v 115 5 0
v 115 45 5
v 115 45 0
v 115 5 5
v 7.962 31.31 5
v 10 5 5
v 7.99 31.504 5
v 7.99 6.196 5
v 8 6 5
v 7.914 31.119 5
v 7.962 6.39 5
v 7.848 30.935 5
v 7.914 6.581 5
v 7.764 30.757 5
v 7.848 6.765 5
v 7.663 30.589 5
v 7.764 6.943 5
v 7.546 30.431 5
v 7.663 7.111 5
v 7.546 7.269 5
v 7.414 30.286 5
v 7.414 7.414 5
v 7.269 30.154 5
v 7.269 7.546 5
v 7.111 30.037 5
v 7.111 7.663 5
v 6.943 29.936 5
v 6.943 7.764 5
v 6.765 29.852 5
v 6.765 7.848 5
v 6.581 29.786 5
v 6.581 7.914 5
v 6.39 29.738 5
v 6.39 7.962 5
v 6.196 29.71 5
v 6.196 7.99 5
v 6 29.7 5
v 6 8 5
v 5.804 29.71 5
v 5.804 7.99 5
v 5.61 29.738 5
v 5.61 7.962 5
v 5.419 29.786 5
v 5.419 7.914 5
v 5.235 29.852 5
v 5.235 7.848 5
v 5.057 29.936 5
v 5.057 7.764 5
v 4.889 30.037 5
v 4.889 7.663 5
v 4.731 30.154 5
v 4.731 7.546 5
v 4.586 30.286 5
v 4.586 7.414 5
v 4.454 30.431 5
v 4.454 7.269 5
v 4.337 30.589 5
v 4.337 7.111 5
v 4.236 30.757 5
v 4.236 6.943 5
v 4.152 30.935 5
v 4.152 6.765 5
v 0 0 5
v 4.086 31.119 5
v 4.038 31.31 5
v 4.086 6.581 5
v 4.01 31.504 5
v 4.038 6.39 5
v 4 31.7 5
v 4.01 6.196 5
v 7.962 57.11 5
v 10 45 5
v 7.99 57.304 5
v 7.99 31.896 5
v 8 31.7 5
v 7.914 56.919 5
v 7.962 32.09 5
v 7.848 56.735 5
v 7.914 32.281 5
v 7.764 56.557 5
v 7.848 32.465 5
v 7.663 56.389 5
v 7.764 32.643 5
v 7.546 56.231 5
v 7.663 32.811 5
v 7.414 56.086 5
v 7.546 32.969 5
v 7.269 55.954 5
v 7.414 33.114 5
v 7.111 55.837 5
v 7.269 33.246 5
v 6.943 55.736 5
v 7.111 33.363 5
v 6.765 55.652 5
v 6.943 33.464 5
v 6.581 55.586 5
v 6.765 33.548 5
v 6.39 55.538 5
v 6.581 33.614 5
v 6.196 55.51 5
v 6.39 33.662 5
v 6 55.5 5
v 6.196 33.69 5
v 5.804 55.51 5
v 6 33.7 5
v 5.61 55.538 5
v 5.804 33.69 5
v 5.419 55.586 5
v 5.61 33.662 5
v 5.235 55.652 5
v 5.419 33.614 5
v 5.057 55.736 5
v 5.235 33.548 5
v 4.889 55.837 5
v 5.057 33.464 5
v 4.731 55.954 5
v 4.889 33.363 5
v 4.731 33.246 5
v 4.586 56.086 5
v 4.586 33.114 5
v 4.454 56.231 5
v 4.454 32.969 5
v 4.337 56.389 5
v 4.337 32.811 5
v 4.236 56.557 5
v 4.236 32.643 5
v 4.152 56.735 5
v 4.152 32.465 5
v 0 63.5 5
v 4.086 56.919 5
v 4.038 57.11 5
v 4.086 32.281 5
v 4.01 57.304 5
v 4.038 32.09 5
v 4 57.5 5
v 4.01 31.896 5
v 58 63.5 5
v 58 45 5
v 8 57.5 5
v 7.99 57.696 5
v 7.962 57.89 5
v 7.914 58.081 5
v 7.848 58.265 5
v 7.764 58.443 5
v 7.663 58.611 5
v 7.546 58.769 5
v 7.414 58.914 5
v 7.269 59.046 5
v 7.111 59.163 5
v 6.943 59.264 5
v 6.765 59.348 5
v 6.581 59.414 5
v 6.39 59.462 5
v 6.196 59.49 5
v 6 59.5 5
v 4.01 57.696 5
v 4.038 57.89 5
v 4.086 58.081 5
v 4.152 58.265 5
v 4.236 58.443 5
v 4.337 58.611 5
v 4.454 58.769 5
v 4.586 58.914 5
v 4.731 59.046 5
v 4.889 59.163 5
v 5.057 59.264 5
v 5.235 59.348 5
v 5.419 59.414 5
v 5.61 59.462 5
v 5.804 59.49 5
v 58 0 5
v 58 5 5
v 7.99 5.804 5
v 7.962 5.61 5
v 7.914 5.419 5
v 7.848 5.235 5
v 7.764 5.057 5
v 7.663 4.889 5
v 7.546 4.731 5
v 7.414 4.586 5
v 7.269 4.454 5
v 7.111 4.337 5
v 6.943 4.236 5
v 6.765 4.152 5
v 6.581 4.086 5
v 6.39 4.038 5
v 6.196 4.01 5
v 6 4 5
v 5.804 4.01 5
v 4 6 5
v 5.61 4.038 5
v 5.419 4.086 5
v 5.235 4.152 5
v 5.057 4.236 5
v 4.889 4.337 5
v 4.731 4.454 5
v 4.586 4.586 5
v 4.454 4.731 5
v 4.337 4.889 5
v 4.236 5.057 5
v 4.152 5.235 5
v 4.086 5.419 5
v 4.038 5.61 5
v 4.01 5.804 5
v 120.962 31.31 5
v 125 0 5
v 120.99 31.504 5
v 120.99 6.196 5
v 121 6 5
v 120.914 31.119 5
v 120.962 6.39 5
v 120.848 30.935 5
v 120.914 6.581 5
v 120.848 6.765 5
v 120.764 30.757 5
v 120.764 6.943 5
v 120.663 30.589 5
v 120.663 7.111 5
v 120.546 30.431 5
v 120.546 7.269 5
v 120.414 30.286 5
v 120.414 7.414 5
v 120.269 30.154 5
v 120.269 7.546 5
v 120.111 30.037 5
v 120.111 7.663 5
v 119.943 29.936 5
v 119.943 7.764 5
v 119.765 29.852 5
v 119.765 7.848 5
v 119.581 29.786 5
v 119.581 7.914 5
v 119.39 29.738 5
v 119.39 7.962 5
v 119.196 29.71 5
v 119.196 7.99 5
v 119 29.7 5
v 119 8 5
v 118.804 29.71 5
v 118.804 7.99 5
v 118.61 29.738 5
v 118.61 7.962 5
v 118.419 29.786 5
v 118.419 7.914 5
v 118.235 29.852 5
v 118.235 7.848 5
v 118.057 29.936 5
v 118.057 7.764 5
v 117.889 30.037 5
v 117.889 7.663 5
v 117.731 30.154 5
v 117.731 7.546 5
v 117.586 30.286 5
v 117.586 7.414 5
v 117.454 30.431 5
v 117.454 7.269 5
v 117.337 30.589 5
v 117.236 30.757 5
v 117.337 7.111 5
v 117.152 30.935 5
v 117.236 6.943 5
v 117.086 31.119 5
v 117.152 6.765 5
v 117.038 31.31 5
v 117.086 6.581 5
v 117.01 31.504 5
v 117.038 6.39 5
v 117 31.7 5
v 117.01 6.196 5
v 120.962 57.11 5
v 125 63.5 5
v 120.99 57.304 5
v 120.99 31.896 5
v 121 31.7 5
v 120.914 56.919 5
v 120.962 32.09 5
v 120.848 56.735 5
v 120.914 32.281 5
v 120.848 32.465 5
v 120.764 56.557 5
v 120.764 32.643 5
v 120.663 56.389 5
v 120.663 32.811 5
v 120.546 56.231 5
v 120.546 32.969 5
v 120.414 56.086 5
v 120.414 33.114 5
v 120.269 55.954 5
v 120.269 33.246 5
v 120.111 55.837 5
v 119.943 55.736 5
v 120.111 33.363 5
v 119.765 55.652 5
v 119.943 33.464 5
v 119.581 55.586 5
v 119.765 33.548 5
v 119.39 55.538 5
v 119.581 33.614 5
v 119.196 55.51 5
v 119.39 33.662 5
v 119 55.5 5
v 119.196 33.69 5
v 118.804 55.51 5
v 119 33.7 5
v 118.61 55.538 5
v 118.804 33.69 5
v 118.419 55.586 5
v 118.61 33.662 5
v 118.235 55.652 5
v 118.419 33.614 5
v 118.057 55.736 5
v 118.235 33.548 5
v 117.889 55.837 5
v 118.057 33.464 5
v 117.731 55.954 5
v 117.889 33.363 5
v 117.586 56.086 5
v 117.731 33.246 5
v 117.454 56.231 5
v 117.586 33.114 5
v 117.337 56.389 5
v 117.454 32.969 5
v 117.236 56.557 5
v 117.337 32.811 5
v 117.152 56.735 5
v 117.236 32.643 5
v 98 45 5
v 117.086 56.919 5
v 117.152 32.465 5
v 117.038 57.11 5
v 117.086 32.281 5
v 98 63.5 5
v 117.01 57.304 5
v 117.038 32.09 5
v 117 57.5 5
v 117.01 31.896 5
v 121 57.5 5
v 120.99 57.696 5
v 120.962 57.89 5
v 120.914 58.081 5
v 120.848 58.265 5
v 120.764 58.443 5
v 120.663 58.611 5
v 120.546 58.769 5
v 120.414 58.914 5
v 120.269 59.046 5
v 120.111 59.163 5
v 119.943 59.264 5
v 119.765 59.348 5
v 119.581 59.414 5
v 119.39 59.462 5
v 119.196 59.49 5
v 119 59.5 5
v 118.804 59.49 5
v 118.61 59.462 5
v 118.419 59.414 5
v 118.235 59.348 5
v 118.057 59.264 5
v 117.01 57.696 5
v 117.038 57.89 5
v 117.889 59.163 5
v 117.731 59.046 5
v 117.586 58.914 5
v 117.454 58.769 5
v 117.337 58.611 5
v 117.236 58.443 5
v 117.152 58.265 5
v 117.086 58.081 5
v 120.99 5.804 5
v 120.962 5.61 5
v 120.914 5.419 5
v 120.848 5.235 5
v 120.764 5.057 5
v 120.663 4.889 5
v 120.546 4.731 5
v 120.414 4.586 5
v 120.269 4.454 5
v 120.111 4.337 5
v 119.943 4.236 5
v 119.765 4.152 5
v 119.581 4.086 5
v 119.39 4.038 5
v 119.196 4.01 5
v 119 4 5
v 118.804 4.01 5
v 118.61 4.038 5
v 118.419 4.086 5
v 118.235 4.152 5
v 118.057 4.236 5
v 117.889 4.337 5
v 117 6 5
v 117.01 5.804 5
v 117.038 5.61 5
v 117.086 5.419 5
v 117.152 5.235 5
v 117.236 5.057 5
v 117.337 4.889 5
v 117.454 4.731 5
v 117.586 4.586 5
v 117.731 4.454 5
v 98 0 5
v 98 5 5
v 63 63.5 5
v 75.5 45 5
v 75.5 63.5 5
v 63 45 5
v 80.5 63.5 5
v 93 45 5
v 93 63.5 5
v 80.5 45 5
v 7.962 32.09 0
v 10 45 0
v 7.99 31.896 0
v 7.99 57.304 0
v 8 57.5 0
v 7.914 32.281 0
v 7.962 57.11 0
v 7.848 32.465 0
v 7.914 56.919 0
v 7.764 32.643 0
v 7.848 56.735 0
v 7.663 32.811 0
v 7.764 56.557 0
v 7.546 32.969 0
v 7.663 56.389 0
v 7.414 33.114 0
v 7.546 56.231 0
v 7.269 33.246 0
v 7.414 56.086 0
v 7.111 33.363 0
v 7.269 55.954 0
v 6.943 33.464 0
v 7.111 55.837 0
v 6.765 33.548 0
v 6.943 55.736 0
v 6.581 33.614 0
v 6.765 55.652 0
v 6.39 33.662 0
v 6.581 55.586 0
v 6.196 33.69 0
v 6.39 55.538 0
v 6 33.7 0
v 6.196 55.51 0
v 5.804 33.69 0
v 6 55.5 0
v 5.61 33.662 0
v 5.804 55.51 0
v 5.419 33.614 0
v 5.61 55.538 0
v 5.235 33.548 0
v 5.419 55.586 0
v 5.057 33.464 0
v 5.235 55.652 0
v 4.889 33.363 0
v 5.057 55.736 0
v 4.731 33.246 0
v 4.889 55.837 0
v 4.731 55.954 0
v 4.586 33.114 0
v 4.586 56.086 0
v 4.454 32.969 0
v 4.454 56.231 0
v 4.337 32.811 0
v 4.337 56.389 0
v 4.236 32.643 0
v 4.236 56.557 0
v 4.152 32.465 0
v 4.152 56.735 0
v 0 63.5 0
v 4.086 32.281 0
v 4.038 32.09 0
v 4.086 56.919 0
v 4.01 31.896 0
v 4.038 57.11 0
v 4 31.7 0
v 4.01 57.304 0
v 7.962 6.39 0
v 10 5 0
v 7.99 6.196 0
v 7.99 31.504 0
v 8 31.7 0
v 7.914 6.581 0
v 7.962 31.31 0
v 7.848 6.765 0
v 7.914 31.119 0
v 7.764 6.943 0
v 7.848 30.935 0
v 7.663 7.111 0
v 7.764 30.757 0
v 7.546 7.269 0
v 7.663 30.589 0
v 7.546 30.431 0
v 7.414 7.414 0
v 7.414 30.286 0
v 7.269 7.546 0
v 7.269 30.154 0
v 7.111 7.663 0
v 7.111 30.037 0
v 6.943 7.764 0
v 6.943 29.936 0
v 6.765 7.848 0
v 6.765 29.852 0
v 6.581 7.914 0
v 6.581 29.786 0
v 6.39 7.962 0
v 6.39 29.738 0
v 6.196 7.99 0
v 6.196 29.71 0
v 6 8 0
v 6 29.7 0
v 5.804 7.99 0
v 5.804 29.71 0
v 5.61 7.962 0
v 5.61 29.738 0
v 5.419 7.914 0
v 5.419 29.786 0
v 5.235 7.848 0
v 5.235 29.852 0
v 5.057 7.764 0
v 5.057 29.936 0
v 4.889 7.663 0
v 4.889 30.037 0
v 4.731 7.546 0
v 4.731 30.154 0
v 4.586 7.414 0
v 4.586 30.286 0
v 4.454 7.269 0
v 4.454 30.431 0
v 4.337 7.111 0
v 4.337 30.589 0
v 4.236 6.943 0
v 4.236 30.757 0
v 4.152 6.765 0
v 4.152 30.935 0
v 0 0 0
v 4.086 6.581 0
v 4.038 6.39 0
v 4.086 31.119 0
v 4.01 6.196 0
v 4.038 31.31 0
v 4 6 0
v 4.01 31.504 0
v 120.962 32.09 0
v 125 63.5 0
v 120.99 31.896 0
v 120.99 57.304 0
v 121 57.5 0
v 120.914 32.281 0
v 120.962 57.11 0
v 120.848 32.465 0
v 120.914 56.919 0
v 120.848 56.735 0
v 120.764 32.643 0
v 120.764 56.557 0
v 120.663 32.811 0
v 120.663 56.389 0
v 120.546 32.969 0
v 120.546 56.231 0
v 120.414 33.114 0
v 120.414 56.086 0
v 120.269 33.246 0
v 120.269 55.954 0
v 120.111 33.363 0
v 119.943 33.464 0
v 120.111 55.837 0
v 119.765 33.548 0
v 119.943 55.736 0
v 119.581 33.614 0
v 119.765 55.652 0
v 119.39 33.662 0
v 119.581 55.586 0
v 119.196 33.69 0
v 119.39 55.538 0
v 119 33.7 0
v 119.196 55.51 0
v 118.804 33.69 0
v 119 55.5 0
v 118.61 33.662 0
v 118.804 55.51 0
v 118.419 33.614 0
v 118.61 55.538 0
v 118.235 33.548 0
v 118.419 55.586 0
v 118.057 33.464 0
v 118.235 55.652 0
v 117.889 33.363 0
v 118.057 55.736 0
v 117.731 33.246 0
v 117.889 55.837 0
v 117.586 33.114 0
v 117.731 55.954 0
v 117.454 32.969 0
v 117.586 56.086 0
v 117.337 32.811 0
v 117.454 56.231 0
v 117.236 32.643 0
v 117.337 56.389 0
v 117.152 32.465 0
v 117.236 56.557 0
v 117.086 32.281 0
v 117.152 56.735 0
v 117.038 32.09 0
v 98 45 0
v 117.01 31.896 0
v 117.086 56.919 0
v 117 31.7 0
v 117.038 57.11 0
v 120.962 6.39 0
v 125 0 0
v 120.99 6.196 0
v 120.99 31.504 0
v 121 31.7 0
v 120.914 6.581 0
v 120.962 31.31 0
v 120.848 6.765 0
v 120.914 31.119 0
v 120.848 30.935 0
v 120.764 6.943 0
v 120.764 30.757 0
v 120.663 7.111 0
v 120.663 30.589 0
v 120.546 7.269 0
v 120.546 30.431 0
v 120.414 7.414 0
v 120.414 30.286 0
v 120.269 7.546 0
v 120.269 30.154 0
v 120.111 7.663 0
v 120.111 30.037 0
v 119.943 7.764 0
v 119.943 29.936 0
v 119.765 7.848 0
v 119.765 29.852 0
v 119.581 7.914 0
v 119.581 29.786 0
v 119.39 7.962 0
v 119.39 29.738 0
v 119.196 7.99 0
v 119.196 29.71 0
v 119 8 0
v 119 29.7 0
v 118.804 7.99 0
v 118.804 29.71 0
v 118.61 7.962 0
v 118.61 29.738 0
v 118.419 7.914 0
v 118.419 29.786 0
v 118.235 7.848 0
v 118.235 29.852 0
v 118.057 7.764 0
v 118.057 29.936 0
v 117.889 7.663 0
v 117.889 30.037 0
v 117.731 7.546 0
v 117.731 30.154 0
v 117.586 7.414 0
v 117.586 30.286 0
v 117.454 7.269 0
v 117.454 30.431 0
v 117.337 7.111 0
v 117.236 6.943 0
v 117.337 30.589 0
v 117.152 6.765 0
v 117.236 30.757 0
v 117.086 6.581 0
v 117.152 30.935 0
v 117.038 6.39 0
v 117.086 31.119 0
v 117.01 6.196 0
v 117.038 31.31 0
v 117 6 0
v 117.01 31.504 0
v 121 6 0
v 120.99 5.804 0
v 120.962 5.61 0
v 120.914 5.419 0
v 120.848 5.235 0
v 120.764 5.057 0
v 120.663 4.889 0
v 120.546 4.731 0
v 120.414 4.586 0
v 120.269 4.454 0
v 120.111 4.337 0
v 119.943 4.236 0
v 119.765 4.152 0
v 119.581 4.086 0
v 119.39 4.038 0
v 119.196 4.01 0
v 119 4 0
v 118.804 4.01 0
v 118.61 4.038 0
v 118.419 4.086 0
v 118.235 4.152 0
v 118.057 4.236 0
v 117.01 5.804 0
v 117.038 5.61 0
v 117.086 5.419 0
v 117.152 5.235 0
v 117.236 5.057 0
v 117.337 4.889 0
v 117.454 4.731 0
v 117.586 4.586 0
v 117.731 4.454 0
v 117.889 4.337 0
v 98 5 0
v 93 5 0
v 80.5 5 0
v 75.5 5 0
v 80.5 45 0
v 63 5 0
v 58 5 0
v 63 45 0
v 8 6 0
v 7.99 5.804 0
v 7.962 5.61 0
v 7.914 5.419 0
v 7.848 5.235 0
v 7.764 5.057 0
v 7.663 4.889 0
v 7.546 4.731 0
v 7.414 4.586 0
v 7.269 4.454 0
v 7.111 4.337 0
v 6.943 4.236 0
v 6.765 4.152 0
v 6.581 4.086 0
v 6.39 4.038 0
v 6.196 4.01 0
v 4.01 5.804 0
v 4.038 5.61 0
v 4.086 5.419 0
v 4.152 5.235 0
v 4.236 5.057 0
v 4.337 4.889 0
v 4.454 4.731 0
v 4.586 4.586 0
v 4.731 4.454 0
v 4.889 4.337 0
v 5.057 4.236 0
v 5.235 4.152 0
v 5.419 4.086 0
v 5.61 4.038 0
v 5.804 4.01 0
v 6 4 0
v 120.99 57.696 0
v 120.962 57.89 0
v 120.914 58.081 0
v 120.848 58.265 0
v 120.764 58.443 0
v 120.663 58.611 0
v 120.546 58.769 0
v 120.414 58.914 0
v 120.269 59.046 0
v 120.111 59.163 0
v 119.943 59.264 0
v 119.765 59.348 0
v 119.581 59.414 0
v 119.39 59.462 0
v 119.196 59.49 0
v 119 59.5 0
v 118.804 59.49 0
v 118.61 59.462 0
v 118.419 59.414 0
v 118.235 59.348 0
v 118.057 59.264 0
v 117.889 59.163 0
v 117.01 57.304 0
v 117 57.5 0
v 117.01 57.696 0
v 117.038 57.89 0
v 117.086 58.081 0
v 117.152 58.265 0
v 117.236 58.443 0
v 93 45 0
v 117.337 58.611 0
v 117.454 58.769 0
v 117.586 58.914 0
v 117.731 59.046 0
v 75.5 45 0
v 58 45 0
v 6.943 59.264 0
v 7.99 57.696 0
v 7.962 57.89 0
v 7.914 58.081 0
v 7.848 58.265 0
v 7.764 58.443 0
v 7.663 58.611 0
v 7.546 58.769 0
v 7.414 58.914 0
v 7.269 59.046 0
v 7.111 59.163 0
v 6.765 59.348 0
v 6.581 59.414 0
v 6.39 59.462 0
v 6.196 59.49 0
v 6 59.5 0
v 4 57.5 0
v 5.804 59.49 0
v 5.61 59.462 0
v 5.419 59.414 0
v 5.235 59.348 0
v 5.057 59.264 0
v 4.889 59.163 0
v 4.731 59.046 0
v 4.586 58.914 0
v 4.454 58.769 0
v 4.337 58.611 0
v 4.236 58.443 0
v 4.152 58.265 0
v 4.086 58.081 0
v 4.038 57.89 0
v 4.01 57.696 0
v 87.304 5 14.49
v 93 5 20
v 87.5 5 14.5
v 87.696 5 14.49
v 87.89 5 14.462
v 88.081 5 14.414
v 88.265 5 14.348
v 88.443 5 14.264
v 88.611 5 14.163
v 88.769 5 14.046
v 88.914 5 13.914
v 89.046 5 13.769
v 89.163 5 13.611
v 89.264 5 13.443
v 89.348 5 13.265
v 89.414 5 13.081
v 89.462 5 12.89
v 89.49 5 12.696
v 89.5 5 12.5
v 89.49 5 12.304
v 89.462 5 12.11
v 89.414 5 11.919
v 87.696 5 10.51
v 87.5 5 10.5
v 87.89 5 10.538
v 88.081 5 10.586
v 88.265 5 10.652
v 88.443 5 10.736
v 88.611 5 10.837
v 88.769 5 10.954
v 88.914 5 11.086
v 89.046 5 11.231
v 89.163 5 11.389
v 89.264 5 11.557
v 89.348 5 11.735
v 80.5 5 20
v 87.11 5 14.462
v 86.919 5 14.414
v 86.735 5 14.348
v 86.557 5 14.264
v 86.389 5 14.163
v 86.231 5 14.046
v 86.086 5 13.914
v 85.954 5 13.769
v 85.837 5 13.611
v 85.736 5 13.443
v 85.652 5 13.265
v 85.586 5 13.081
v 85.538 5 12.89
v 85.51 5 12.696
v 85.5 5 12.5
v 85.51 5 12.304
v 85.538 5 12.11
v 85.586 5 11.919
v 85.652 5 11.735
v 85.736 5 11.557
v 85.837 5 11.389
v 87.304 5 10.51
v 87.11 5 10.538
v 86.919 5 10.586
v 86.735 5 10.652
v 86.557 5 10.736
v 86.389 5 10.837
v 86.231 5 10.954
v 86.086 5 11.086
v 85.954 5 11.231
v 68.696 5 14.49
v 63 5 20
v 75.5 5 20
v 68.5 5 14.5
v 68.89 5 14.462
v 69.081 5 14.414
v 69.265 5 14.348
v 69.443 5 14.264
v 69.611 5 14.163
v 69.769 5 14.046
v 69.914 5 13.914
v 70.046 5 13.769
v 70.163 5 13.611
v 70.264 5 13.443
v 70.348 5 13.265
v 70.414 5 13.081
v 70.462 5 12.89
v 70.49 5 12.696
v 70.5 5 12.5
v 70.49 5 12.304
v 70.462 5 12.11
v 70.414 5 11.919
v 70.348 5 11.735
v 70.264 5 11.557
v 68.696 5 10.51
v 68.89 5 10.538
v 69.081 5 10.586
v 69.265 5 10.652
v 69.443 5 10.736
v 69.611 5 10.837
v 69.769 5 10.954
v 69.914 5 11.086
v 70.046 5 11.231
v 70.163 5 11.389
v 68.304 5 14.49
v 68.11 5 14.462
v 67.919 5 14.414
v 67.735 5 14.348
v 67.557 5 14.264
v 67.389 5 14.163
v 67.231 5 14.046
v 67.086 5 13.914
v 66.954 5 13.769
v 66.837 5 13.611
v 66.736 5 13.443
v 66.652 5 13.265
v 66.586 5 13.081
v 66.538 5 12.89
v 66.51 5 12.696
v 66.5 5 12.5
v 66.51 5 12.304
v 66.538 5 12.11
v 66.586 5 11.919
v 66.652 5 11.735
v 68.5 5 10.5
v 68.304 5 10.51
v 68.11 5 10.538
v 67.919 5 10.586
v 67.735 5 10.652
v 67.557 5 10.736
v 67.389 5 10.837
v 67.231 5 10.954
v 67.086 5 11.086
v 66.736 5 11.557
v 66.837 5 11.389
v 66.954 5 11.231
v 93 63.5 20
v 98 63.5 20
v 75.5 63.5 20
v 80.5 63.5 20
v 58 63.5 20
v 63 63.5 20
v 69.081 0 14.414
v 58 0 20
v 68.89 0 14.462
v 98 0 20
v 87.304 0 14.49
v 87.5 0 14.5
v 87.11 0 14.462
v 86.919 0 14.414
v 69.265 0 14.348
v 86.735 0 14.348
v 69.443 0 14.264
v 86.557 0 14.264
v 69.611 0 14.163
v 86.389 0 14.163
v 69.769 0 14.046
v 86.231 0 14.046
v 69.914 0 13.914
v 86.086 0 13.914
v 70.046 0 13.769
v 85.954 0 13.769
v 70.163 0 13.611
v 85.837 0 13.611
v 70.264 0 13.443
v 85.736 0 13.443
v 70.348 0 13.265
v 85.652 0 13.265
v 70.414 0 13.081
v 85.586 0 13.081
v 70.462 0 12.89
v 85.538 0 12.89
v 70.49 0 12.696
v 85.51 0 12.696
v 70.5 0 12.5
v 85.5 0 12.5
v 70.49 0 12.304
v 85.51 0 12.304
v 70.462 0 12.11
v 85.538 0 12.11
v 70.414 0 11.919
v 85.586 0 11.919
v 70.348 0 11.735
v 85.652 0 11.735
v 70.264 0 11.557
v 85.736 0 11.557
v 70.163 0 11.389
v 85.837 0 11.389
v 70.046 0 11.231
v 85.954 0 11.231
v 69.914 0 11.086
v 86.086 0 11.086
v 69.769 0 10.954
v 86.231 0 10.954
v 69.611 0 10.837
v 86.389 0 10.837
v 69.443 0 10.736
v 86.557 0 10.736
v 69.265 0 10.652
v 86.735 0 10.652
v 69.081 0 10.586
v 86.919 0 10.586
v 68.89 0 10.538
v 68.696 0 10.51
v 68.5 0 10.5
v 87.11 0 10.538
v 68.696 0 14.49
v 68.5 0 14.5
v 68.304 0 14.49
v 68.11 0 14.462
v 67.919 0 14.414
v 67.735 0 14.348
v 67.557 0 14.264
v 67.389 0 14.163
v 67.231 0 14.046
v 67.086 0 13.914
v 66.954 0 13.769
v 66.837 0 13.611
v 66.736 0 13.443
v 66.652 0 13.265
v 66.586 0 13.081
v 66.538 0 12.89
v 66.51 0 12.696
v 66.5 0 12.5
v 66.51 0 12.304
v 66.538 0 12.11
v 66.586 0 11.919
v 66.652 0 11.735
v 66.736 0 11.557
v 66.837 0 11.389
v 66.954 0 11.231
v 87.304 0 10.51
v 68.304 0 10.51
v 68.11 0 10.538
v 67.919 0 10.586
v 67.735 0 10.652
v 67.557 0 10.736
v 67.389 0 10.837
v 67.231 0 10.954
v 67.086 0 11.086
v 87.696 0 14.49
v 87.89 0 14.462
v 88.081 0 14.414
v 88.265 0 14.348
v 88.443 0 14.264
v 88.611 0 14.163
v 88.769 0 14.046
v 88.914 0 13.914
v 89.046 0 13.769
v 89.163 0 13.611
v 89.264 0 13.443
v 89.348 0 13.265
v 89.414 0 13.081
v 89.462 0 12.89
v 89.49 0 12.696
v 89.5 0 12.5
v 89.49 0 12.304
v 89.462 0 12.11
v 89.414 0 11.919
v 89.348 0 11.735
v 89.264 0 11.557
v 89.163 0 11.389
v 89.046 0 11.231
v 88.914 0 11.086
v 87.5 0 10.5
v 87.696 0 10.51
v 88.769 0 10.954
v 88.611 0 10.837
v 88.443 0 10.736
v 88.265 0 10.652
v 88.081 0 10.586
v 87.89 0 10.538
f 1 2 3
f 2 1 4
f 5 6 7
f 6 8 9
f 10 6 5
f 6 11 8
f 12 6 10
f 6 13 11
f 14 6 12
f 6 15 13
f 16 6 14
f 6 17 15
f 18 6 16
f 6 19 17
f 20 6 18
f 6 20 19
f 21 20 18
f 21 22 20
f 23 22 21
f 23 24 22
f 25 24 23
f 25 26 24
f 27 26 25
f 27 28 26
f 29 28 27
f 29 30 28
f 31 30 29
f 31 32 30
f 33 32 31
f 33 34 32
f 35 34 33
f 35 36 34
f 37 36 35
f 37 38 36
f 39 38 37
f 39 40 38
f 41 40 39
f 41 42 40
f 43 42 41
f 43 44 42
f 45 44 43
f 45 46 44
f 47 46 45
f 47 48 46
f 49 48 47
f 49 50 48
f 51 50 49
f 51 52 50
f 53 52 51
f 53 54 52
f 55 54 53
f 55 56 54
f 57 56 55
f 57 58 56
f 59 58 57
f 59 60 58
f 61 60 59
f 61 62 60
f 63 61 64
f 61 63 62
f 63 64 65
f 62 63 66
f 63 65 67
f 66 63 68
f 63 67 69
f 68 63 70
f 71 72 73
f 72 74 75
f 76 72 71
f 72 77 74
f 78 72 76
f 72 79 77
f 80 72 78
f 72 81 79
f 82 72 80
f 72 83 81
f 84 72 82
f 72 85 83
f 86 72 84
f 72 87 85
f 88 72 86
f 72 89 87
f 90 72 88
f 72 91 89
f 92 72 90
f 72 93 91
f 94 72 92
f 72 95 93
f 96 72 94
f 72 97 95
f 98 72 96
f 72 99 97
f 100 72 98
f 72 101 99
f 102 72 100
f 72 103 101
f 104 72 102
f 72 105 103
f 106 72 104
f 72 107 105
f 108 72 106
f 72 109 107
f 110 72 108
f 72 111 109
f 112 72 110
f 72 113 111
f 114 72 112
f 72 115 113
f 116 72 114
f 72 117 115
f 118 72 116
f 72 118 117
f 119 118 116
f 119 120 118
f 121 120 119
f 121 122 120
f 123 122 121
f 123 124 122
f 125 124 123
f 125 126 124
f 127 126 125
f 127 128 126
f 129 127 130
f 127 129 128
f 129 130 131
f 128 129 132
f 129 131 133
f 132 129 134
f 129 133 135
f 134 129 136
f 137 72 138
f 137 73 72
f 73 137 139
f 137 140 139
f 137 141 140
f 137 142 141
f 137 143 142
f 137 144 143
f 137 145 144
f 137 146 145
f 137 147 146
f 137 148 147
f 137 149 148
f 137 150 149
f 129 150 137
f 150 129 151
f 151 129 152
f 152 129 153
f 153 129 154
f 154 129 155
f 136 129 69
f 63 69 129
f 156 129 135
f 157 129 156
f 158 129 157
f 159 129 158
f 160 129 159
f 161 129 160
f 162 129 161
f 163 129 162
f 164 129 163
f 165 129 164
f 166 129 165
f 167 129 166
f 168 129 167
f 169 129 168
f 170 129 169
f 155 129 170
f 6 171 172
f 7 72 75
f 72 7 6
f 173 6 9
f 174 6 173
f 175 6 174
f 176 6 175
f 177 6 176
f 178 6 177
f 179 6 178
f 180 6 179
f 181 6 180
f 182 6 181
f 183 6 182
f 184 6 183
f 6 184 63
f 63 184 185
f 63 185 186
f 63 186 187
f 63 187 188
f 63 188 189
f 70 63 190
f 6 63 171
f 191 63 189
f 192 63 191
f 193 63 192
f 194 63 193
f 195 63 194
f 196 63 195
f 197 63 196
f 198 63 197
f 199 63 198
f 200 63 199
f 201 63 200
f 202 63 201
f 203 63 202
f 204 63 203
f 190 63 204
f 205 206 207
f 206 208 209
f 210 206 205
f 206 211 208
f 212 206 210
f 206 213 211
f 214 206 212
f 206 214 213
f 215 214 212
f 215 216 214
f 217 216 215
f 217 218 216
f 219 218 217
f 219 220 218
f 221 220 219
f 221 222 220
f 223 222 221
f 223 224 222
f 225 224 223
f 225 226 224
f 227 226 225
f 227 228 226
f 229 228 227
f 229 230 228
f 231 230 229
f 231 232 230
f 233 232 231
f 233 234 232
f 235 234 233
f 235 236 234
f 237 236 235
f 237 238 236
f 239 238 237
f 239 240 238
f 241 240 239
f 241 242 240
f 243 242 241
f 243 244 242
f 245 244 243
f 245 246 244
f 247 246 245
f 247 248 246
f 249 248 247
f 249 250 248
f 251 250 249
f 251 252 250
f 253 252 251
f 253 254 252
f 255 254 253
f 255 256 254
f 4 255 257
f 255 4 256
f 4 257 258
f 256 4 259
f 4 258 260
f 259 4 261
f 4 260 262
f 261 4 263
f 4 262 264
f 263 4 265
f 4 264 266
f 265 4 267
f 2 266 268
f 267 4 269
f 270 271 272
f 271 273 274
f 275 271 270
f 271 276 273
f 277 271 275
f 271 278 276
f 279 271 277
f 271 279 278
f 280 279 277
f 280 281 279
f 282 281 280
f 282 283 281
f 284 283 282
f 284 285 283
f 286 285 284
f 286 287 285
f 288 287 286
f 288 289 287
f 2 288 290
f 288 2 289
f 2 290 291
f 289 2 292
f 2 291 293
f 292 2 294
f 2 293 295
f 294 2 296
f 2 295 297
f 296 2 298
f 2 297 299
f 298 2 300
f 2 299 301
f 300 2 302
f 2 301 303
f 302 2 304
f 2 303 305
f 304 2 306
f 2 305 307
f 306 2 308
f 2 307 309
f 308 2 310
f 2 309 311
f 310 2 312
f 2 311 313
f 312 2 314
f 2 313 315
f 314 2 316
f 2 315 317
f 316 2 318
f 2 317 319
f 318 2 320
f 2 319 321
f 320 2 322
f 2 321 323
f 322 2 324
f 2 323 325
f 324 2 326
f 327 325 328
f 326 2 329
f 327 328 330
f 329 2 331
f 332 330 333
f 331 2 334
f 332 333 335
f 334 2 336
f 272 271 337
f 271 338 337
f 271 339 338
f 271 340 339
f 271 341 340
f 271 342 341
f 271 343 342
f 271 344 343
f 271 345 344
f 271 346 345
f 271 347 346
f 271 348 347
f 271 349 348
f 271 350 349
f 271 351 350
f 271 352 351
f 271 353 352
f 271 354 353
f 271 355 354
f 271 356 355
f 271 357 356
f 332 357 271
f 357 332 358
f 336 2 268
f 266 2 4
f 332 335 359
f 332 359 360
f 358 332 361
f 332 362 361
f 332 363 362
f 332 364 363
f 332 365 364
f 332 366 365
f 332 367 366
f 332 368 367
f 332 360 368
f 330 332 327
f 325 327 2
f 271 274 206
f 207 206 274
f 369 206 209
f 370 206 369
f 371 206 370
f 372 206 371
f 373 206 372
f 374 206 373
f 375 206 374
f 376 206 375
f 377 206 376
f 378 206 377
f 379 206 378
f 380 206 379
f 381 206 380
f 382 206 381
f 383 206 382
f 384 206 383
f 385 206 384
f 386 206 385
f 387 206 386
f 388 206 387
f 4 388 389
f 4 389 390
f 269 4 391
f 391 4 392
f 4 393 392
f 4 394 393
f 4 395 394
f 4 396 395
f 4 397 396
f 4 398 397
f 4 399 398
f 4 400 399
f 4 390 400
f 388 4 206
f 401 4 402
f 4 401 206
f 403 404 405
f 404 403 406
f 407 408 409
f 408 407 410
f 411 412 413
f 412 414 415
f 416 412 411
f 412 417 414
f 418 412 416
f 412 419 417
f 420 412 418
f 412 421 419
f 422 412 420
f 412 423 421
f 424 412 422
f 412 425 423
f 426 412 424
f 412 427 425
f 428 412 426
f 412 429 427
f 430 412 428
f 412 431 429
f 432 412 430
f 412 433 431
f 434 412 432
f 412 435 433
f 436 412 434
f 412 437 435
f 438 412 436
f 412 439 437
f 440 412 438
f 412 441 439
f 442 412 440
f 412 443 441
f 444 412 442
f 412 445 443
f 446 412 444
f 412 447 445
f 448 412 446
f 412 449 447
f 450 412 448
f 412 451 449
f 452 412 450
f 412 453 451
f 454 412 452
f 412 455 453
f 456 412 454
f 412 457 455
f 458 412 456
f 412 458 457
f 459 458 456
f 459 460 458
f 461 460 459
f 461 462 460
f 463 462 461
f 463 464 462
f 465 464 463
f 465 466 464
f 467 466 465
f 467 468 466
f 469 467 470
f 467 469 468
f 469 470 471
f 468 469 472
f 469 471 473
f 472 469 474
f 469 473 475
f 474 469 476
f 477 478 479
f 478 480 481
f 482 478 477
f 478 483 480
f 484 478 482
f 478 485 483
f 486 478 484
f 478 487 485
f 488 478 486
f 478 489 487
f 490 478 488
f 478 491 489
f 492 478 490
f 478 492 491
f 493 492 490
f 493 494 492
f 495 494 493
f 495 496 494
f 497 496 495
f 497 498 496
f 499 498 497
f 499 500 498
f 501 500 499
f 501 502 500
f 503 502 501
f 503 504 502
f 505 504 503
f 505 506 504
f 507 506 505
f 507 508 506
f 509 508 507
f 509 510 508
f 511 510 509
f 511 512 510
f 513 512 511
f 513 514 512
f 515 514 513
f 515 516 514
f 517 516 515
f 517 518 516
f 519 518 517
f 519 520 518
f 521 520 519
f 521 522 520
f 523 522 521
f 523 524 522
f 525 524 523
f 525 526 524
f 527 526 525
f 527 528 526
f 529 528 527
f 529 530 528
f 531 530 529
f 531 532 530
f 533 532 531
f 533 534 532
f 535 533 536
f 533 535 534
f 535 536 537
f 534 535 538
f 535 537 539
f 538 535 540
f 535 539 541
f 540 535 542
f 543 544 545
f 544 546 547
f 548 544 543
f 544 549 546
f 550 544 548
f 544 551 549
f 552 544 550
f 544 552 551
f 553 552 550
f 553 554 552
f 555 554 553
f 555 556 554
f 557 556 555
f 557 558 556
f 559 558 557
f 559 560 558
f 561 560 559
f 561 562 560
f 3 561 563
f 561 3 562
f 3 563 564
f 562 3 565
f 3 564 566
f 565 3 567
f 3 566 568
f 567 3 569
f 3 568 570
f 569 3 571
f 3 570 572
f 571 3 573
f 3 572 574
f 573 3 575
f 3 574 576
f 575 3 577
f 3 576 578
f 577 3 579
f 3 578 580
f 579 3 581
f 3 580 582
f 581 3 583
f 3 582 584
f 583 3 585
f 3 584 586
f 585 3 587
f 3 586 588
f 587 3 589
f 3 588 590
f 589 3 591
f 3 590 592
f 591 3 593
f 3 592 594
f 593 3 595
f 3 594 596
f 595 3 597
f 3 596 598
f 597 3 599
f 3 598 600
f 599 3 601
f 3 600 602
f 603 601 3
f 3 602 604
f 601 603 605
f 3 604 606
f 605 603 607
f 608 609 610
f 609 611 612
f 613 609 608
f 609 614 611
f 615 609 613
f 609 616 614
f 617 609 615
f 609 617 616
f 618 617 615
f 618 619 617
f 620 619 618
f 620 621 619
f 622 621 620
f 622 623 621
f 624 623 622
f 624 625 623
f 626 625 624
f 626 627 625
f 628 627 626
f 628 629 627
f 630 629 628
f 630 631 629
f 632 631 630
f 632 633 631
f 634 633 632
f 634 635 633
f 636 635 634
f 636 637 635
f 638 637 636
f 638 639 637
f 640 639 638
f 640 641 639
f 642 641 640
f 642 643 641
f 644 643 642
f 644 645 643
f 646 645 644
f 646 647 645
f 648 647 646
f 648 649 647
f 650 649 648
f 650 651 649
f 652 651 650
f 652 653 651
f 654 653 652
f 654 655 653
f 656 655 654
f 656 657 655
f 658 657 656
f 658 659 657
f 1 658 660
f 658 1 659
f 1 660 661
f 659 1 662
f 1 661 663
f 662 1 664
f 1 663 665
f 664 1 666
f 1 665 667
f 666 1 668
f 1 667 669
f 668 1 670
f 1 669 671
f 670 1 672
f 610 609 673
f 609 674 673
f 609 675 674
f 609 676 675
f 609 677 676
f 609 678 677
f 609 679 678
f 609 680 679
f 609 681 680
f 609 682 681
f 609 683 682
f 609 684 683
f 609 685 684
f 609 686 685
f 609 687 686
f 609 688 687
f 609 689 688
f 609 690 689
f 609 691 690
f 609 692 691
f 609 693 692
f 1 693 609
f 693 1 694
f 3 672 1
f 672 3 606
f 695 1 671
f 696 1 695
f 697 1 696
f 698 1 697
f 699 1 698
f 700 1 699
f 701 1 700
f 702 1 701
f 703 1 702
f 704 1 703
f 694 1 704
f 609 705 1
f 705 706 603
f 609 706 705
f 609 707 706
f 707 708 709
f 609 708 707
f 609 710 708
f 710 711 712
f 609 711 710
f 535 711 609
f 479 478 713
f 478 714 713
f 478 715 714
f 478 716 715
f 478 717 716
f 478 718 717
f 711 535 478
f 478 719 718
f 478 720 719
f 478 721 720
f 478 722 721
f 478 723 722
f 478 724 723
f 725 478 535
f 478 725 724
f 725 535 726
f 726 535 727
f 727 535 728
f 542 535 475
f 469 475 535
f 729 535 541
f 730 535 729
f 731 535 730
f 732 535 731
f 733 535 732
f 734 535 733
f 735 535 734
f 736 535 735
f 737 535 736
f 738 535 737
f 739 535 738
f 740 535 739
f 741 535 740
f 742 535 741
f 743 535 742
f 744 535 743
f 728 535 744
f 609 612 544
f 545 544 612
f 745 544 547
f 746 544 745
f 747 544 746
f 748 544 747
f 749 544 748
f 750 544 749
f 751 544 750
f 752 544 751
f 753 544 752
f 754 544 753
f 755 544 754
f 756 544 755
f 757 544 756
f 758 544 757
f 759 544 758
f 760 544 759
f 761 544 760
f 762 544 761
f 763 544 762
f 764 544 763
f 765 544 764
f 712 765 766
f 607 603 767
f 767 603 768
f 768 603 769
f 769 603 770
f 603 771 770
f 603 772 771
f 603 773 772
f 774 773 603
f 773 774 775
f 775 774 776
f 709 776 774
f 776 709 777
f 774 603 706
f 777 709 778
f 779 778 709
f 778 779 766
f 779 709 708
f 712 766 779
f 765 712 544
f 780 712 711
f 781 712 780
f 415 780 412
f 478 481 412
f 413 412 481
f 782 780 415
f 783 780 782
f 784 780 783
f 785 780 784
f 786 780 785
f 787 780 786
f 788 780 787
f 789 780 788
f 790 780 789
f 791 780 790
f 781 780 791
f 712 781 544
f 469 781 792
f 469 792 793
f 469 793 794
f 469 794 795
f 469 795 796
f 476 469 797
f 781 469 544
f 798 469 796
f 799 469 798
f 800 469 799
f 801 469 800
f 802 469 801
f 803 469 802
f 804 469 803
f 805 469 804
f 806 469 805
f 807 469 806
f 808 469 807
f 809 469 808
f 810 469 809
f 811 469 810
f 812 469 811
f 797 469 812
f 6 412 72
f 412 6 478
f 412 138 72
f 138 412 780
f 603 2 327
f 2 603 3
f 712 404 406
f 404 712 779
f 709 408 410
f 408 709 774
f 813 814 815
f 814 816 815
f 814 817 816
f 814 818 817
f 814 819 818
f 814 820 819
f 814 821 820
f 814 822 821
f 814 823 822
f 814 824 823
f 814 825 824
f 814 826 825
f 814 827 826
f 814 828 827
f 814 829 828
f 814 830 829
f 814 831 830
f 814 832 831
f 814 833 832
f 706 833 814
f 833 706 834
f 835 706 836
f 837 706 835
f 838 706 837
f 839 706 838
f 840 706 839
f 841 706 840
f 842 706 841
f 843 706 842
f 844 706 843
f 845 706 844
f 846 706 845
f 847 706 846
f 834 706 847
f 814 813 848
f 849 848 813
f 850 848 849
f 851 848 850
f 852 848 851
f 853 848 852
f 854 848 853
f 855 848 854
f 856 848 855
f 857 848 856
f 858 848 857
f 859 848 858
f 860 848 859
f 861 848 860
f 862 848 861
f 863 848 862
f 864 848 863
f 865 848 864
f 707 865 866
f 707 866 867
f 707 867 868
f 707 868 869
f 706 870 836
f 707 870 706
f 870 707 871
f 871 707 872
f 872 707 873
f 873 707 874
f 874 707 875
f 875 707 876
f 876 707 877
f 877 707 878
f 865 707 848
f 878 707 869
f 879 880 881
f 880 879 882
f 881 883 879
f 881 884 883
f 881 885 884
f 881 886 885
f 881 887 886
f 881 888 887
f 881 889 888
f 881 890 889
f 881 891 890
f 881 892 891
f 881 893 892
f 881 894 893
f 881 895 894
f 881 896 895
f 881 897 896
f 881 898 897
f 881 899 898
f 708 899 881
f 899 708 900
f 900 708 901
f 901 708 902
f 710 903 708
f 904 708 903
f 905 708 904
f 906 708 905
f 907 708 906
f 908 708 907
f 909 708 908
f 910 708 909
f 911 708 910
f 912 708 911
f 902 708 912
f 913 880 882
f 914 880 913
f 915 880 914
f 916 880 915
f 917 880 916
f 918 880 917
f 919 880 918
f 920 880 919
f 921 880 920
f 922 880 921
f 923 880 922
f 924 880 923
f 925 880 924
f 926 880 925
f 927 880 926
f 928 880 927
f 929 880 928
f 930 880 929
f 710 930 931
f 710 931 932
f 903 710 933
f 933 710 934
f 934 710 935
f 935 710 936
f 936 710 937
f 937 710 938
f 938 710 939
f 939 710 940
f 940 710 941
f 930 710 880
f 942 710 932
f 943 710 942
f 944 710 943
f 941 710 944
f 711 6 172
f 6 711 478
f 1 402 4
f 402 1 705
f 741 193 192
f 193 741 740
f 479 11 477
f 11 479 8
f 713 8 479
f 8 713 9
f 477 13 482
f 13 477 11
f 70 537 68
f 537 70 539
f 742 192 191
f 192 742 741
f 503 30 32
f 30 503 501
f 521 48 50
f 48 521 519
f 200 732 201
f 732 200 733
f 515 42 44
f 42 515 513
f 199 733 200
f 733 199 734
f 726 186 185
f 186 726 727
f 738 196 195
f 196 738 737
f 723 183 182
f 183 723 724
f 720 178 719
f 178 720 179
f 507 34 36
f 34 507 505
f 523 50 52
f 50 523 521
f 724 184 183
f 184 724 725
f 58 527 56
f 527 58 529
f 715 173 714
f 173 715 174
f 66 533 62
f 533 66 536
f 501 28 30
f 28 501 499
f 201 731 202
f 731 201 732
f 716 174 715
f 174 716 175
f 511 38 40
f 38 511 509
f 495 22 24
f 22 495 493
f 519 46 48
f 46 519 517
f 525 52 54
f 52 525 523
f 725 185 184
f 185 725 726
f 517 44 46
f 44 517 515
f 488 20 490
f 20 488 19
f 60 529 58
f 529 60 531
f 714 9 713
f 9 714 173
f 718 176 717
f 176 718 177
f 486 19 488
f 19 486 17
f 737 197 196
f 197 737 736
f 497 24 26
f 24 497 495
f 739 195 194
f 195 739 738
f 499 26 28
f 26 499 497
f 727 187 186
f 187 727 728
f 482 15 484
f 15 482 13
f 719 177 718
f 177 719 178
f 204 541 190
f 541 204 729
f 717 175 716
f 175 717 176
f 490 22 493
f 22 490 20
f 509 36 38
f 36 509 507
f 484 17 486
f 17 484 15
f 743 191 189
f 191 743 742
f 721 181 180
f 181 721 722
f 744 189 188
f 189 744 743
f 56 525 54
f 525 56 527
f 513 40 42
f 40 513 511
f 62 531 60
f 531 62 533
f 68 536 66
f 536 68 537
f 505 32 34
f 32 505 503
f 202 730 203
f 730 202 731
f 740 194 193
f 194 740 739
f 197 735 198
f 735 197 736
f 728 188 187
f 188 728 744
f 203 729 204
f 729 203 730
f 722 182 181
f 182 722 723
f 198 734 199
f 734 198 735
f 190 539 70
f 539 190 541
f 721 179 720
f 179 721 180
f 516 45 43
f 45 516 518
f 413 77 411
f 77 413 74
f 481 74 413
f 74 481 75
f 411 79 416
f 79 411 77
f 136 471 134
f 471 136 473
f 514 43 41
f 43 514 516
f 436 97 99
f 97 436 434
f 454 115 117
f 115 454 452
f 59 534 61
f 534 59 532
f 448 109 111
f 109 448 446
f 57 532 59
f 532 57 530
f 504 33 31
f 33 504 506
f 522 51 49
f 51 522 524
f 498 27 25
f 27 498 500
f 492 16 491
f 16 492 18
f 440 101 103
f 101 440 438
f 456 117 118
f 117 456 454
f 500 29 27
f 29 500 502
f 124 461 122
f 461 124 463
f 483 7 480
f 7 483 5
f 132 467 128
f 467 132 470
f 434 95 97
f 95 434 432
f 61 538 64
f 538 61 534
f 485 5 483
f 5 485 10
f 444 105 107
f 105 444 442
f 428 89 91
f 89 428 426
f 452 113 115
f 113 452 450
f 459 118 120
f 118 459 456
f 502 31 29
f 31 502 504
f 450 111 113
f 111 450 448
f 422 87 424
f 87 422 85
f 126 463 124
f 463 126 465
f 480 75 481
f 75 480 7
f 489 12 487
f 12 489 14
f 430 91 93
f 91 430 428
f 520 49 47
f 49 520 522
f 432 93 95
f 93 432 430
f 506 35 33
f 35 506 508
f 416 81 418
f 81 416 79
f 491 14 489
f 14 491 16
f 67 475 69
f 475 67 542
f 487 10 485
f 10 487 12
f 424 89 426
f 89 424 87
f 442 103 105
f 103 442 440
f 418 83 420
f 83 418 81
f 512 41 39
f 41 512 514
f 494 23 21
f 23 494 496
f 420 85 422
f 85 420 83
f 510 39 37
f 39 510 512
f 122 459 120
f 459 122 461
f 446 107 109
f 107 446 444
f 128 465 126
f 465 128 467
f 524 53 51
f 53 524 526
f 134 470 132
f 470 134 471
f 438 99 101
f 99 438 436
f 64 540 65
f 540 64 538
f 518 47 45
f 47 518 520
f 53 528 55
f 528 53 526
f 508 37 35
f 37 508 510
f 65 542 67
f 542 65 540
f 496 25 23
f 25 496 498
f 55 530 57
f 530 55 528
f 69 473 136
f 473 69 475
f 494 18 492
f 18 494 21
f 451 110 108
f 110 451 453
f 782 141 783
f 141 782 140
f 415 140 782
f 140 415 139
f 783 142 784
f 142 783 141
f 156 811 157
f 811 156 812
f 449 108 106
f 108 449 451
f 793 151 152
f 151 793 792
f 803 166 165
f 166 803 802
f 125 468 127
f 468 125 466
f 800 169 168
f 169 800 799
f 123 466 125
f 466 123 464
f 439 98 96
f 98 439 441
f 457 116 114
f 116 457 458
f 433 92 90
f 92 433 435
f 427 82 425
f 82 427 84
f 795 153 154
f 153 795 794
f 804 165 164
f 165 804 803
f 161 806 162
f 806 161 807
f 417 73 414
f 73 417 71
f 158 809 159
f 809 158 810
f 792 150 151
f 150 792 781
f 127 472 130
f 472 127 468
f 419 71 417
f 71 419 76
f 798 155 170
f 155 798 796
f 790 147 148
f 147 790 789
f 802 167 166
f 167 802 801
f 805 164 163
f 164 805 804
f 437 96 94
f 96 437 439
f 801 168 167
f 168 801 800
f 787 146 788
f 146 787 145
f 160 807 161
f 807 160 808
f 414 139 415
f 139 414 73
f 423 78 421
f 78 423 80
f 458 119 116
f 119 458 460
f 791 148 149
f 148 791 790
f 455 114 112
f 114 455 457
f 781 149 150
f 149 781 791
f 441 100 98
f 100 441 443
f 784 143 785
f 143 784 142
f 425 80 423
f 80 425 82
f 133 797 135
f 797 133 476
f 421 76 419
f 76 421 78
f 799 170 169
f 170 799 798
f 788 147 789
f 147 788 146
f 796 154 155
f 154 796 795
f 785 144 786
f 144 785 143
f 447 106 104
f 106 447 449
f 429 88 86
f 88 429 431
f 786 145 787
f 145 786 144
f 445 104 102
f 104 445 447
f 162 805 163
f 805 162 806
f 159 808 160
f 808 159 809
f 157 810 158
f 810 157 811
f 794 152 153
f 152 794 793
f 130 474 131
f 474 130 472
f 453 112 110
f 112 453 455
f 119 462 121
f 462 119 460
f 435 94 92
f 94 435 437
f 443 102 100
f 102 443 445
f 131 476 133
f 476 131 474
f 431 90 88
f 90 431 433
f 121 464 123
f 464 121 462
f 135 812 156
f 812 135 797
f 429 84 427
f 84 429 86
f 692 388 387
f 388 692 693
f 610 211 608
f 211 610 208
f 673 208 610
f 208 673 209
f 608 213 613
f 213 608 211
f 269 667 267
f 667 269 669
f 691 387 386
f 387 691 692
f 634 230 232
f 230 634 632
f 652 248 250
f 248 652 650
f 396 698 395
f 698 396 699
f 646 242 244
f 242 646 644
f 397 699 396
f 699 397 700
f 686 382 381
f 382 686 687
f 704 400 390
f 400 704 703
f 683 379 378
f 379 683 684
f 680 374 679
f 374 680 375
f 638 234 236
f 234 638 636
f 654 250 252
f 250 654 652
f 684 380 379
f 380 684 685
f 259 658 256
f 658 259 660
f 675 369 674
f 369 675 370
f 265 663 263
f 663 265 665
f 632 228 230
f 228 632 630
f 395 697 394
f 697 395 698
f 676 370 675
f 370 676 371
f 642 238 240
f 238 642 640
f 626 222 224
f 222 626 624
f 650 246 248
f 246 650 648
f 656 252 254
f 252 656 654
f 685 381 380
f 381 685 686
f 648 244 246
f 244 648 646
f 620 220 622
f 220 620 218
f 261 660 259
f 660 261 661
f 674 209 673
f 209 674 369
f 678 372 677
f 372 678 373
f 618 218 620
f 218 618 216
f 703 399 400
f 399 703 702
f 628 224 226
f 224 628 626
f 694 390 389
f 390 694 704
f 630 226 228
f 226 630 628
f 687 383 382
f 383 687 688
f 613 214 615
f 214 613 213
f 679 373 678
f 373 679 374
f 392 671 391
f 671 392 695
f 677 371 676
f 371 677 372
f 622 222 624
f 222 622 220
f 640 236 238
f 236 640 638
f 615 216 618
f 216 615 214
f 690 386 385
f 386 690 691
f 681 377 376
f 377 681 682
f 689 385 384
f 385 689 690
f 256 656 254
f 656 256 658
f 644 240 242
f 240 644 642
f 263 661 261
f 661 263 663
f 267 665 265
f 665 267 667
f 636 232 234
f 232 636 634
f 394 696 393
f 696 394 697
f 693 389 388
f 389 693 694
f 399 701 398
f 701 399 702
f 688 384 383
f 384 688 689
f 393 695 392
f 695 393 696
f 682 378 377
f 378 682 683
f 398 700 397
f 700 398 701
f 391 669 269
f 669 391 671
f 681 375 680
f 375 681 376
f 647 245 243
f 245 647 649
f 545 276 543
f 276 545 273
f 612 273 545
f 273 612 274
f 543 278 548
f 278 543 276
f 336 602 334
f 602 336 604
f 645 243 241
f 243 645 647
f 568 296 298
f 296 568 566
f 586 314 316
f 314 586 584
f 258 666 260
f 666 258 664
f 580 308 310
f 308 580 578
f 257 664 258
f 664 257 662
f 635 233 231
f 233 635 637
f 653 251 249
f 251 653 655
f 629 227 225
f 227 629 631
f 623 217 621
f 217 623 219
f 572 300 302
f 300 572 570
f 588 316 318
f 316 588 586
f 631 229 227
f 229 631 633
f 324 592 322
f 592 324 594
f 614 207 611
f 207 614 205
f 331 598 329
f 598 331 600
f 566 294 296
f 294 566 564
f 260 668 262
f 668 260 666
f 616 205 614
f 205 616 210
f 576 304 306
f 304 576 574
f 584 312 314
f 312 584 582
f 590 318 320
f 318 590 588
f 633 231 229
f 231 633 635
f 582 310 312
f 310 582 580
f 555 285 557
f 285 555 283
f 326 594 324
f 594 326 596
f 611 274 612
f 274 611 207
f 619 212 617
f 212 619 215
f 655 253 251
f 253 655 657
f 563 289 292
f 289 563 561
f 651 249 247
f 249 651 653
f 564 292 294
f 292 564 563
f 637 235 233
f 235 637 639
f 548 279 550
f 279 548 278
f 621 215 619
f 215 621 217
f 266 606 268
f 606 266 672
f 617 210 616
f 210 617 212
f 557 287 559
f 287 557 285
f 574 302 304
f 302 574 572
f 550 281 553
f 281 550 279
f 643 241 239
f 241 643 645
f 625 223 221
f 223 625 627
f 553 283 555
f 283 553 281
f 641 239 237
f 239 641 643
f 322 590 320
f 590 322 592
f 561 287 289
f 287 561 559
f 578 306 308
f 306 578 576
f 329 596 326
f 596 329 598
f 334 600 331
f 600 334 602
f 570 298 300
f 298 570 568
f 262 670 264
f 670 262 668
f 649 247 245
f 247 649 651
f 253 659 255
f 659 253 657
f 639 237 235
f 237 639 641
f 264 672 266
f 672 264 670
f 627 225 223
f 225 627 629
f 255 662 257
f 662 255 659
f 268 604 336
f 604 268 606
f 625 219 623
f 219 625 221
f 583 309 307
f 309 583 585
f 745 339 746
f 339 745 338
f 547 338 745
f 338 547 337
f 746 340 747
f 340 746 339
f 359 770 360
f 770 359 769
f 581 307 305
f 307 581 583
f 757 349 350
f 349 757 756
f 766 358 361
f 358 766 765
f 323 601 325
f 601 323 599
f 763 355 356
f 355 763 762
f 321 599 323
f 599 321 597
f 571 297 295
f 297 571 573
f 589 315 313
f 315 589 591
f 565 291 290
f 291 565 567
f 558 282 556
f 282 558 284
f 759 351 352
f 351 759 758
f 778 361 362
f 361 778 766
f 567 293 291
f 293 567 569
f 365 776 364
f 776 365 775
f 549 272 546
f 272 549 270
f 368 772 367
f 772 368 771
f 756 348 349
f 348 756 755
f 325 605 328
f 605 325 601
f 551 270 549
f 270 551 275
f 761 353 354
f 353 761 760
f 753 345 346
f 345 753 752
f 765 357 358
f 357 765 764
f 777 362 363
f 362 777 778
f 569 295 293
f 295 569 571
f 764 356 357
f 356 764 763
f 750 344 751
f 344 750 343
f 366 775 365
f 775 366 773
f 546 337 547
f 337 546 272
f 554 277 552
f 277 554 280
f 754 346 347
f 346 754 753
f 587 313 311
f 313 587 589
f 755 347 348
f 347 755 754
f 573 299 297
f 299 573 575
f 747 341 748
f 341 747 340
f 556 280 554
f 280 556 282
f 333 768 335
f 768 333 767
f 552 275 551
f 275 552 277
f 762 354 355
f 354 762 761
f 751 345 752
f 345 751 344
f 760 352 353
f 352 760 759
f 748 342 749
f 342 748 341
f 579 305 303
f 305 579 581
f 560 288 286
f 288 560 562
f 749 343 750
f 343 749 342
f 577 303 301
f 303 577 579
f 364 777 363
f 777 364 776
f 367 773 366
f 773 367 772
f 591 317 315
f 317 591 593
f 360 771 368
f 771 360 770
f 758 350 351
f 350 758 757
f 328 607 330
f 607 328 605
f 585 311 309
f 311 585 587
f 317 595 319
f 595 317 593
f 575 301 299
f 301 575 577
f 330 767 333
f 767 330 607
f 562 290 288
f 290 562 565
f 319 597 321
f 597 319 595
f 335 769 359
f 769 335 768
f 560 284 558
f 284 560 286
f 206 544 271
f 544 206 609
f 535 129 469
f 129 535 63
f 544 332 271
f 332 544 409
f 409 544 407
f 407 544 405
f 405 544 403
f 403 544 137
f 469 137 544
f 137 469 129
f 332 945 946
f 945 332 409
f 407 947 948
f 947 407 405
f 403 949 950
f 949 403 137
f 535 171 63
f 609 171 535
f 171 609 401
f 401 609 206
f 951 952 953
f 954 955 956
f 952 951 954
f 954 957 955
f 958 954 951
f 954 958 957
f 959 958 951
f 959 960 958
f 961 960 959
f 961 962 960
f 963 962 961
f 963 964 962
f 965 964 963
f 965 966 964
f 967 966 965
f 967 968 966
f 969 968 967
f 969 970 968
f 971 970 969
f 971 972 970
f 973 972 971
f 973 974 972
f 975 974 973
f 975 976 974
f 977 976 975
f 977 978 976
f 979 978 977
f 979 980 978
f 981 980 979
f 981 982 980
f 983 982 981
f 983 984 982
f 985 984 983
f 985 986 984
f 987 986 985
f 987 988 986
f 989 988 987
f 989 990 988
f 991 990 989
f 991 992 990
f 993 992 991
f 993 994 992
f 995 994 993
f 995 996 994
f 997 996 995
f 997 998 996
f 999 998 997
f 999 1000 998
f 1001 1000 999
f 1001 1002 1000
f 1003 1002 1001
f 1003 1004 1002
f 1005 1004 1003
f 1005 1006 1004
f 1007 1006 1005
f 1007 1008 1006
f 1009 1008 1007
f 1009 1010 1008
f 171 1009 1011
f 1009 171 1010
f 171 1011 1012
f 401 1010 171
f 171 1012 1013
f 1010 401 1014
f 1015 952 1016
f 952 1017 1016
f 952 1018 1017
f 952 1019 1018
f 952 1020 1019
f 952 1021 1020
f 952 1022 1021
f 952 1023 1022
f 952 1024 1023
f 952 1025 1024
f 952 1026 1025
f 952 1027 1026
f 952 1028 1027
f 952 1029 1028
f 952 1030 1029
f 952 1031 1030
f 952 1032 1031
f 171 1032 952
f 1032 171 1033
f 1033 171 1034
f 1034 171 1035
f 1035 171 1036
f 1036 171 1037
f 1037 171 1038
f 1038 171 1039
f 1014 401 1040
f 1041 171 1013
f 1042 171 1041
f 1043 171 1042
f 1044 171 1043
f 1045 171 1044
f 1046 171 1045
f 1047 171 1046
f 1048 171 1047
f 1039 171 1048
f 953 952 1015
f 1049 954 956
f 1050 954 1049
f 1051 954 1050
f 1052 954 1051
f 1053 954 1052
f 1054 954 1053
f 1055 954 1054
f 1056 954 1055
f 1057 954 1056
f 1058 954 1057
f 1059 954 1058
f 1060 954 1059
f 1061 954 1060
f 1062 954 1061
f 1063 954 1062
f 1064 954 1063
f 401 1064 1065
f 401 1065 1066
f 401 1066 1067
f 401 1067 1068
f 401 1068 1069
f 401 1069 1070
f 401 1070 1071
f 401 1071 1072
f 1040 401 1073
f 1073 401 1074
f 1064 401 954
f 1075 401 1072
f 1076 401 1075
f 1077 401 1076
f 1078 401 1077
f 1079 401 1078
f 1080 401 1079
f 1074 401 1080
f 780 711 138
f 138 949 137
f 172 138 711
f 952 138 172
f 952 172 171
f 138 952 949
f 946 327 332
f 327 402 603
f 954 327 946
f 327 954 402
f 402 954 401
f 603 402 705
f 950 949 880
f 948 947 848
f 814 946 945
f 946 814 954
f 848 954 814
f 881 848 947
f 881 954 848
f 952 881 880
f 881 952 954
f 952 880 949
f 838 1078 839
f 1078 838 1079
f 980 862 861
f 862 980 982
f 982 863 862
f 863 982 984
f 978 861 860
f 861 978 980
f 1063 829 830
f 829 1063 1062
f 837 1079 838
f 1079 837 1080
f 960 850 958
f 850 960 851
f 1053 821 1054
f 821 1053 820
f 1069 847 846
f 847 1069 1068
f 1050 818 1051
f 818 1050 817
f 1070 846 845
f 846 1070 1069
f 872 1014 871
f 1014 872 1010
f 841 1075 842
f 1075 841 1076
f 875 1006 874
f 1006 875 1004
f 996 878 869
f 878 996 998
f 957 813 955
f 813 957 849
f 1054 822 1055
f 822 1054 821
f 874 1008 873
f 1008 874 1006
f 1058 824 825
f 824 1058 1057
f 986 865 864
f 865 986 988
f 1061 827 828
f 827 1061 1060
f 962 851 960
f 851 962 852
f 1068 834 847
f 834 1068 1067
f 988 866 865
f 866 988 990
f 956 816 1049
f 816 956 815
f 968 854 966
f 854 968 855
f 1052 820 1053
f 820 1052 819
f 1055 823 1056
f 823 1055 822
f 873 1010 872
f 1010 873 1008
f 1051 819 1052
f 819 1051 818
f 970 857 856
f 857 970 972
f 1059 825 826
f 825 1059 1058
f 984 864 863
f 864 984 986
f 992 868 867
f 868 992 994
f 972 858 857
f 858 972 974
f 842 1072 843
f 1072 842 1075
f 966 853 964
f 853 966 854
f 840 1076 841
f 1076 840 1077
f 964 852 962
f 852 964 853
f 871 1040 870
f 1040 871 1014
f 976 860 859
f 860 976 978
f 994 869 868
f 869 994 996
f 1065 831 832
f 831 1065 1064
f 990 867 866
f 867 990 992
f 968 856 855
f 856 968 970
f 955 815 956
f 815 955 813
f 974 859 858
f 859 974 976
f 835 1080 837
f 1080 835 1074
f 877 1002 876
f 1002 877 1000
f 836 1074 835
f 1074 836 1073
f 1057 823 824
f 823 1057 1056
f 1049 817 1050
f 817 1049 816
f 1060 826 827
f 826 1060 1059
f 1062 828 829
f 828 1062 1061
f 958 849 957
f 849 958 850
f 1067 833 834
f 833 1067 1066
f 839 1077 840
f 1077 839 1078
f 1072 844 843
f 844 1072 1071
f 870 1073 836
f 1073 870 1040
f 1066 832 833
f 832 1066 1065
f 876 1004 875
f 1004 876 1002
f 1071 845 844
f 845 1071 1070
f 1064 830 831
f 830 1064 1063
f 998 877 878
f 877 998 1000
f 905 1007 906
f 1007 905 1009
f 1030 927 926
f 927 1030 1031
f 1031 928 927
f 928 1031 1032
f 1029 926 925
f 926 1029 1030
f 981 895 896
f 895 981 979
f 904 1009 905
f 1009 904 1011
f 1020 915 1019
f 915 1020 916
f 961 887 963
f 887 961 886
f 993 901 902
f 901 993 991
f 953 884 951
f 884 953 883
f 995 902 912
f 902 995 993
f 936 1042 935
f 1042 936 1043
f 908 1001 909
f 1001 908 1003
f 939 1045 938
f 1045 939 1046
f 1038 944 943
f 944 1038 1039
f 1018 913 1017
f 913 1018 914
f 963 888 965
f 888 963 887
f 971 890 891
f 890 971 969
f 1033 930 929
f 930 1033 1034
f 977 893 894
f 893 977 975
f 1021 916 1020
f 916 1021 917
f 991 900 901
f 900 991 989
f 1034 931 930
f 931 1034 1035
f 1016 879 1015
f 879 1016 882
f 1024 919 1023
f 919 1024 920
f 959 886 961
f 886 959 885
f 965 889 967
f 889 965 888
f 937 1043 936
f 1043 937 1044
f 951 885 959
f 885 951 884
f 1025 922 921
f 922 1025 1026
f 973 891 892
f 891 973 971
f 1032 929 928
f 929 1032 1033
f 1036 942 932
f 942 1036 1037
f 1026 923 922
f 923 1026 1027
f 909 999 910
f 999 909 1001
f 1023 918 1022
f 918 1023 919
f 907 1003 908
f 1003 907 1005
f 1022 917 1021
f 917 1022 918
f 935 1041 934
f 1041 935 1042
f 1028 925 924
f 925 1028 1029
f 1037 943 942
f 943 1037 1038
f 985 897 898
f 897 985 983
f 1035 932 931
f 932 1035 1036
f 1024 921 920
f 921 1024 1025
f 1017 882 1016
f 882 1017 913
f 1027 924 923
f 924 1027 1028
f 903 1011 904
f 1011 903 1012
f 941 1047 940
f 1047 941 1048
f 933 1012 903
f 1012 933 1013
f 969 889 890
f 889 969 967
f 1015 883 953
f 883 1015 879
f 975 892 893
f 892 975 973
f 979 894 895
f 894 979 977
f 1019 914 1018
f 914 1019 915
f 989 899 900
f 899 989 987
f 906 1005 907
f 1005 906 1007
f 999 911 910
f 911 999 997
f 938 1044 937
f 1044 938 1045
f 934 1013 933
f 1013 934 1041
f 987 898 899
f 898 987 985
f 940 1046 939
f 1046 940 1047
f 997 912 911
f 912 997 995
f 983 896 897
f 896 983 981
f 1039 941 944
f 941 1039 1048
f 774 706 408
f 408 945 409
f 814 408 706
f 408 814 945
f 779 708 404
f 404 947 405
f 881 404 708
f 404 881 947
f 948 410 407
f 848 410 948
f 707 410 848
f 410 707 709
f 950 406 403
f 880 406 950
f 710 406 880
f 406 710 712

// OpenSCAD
// iMac G3 PSU mount for back of the ITX mobo plate.
// Ryan Crosby 2020
//
// All units are in mm

//
// Constants
//

// Pretty round things with bigger numbers
// 16 = Good for draft
// 64 = Good for export
$fn=64;

// Floating point errors can cause difference operations to leave really thin faces where there should be none.
// Add this to subtracted object dimensions where appropriate to prevent this.
SEM = 0.0000001;

//
// Imports
//

//
// Variables
//

baseplate_post_height = 7.5;

screw_a_pos = [5, -22, baseplate_post_height];
screw_b_pos = screw_a_pos + [70, 5, 0];

//
// Modules
//

module screw_hole(h = 5) {
    cylinder(d = 3 + 1, h = h);
}

module psu_mount_plate() {
    difference() {
        psu_width = 125;
        psu_height = 63.5;

        cube([psu_width, psu_height, 5]);

        union() {
            translate([10, 5, 0])
            cube([psu_width - 10 * 2, 40, 5]);

            %translate([10, 5, 0])
            cube([33, 40, 5]);

            screw_x_offset = 6;
            screw_y_offset = 6;

            translate([screw_x_offset, screw_y_offset, 0])
            screw_hole();

            translate([screw_x_offset, screw_y_offset + 25.7, 0])
            screw_hole();

            translate([screw_x_offset, screw_y_offset + 51.5, 0])
            screw_hole();

            translate([screw_x_offset + 113, screw_y_offset, 0])
            screw_hole();

            translate([screw_x_offset + 113, screw_y_offset + 25.7, 0])
            screw_hole();

            translate([screw_x_offset + 113, screw_y_offset + 51.5, 0])
            screw_hole();
        }
    }
}

module mobo_mount_plate() {
    plate_height = 20;
    plate_width = 40;

    union() {
        difference() {
            cube([plate_width, plate_height, 5]);

            translate([plate_width /2 - 19 /2, plate_height /2 + 2.5, 0])
            screw_hole();

            translate([plate_width /2 + 19 /2, plate_height /2 + 2.5, 0])
            screw_hole();
        }

        cube([5, 20, 63.5]);

        translate([plate_width /2 - 2.5, 0, 0])
        cube([5, 20, 63.5]);

        translate([plate_width - 5, 0, 0])
        cube([5, 20, 63.5]);
    }
}


module psu_bracket() {
    union() {
        psu_mount_plate();

        translate([53 + 45, 0, 0])
        //translate([0, 5, 0])
        rotate([90, 0, 180])
        mobo_mount_plate();
    }
}

psu_bracket();

//mobo_mount_plate();
